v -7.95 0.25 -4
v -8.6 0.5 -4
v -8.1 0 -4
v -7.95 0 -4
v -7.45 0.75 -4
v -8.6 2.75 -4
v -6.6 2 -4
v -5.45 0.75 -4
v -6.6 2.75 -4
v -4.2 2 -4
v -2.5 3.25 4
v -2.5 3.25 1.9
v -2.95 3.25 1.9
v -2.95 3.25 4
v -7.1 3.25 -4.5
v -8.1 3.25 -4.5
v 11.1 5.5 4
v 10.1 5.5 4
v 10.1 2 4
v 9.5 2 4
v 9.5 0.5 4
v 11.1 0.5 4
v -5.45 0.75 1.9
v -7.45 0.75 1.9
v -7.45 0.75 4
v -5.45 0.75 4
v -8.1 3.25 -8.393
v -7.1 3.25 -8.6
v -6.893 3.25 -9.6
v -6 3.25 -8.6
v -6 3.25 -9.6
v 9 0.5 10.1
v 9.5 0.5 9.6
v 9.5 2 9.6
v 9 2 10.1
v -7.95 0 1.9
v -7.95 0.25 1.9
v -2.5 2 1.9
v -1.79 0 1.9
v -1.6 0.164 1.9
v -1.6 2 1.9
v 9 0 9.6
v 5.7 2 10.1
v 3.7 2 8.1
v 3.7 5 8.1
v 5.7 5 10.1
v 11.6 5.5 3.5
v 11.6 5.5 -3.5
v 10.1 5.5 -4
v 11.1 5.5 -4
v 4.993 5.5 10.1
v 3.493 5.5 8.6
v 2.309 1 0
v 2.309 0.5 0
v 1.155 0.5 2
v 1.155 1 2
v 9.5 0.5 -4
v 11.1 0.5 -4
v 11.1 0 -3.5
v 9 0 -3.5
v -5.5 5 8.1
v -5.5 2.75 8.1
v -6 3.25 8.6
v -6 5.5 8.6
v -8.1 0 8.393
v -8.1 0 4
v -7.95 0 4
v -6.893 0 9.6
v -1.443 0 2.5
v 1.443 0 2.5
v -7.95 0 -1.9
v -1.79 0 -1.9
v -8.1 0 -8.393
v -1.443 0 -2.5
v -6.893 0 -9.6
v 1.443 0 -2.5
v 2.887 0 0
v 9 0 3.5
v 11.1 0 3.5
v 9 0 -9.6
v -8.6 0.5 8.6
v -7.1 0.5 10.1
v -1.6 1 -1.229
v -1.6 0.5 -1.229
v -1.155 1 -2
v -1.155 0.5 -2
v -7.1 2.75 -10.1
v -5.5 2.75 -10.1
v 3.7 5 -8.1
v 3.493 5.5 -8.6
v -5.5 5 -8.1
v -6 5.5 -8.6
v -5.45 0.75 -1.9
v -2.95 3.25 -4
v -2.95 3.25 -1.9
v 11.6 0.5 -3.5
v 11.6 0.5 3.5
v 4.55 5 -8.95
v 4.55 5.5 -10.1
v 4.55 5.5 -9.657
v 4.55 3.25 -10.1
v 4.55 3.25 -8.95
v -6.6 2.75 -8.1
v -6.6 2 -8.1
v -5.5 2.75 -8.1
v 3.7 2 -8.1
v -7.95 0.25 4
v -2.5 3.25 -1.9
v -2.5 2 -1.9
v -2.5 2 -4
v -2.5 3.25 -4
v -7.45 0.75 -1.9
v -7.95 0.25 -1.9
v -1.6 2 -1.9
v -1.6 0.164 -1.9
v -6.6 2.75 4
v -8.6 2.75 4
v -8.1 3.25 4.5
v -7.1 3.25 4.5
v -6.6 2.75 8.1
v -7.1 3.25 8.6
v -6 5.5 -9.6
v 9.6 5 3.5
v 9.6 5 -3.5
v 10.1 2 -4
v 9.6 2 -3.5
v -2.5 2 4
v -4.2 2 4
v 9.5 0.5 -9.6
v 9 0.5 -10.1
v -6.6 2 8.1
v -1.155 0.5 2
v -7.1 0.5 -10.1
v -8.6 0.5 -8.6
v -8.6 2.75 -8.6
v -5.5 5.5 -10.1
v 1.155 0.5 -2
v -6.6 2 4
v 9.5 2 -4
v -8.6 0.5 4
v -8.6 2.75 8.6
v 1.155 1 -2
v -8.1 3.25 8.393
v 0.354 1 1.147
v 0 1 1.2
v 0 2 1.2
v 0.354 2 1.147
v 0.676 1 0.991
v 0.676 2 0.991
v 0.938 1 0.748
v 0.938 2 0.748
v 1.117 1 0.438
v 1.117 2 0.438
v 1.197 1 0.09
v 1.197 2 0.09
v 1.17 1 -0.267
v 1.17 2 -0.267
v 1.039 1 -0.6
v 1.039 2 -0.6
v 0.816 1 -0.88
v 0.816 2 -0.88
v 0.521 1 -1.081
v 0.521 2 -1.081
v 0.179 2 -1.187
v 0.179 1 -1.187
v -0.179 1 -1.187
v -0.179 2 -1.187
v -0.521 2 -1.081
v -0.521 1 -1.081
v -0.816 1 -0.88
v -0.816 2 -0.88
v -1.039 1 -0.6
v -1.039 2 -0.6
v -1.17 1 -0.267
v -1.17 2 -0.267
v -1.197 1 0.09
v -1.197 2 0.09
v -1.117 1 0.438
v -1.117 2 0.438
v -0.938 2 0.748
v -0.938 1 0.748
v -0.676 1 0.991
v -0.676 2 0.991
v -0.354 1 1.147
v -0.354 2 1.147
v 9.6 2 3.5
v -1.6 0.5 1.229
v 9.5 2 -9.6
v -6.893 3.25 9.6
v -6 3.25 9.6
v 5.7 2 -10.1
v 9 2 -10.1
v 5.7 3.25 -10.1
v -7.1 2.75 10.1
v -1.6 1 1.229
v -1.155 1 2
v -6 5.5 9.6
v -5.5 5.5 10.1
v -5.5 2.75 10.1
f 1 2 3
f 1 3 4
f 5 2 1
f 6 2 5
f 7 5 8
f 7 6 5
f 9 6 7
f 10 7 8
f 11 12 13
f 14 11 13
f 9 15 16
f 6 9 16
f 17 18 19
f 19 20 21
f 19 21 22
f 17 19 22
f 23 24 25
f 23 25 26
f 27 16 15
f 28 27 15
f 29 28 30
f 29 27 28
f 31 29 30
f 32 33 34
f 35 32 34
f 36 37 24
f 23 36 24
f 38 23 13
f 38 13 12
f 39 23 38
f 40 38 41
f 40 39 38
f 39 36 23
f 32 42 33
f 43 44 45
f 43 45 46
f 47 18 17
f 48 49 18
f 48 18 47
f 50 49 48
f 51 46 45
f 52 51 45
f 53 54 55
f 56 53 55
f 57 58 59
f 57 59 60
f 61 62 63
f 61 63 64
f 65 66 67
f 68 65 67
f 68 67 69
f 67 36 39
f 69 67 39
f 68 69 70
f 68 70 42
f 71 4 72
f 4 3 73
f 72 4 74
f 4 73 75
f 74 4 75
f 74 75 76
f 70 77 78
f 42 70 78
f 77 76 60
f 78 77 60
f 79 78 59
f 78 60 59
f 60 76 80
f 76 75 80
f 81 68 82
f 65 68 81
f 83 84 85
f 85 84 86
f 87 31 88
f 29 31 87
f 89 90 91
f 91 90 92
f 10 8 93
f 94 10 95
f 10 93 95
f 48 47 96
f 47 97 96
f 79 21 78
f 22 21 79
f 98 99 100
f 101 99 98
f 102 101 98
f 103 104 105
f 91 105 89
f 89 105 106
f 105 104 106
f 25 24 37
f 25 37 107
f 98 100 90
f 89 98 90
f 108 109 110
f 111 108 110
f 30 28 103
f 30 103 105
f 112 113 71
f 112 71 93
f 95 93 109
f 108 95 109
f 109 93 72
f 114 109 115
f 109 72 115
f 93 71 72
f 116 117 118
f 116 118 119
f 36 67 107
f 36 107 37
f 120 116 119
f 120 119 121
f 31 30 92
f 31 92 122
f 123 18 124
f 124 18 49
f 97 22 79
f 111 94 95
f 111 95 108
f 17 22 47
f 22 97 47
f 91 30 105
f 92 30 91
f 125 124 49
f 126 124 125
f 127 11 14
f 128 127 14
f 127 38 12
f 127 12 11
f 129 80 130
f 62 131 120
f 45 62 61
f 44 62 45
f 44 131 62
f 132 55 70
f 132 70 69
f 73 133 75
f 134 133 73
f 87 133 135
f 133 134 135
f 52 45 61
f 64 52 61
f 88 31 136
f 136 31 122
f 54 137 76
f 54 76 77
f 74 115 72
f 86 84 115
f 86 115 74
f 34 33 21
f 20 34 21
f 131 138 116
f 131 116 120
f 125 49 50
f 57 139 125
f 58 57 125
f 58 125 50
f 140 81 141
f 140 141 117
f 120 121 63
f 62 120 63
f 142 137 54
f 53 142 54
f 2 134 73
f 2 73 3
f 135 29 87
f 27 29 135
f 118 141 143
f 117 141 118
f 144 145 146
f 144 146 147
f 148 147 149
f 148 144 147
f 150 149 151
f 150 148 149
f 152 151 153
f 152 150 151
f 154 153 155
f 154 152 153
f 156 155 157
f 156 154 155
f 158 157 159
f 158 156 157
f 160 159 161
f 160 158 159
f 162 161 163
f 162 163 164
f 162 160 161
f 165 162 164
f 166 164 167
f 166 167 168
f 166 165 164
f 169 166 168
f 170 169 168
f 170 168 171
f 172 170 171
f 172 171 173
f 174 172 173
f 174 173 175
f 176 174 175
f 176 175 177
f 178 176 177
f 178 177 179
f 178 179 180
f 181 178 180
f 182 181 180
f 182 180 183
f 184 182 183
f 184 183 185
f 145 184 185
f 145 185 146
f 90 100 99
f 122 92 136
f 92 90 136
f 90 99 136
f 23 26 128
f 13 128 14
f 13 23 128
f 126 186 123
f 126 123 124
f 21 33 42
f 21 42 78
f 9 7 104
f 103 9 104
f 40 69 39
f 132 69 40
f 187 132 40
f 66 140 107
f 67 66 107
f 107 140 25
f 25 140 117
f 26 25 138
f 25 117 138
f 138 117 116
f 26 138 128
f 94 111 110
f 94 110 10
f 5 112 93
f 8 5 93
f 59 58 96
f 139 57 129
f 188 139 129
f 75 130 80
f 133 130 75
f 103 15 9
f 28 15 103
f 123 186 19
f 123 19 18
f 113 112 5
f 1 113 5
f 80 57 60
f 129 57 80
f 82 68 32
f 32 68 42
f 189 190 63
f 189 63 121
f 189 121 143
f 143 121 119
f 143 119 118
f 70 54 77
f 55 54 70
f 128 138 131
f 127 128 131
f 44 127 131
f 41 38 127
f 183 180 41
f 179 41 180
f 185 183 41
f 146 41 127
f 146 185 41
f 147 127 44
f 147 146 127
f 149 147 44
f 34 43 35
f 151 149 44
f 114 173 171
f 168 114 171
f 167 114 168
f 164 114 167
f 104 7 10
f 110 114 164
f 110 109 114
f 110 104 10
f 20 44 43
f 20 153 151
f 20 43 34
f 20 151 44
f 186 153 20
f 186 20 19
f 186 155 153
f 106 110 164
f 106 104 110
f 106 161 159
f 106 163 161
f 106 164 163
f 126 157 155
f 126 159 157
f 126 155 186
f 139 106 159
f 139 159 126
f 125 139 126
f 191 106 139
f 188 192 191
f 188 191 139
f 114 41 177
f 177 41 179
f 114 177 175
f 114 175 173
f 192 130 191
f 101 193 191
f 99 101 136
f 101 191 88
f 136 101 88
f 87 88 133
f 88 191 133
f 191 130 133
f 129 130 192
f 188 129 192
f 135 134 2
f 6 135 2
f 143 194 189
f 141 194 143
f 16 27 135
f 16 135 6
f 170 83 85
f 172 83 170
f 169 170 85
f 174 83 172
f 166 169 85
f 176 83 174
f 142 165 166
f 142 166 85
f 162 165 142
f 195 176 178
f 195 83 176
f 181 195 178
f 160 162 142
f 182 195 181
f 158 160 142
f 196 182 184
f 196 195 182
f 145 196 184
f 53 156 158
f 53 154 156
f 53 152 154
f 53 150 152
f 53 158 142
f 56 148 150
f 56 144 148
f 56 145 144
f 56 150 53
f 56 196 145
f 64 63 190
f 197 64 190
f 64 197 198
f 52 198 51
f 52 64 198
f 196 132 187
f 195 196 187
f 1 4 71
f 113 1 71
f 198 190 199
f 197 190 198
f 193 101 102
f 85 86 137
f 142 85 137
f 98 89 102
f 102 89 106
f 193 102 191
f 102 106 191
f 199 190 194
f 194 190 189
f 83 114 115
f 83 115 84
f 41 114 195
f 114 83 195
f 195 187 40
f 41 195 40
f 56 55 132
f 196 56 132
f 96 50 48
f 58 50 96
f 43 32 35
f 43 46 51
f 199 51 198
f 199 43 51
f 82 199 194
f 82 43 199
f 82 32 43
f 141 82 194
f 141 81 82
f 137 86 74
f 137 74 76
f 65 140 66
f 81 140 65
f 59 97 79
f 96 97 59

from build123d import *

# Parameters (mm, degrees)
SKETCH1_R           = 1.2
BOSS_EXTRUDE1_DEPTH = 2
SKETCH2_W           = 2
SKETCH2_H           = 8
BOSS_EXTRUDE2_DEPTH = 1.25
SKETCH3_W           = 2
SKETCH3_H           = 8
BOSS_EXTRUDE3_DEPTH = 2.25
CUT_EXTRUDE1_DEPTH  = 1
CUT_EXTRUDE2_DEPTH  = 2.1
CUT_EXTRUDE3_DEPTH  = 2.1
CHAMFER1_SIZE       = 1.5
CHAMFER2_SIZE       = 0.5


with BuildPart() as part:
    # Sketch1 → Boss-Extrude1 (new body)
    with BuildSketch(Plane(origin=(0, 0, 0), x_dir=(1, 0, 0), z_dir=(0, 1, 0))):
        Polygon((-8.6, -10.1), (9.5, -10.1), (9.5, -4), (11.6, -4), (11.6, 4), (9.5, 4), (9.5, 10.1), (-8.6, 10.1), (-8.6, 4), (-7.95, 4), (-7.95, 1.9), (-1.6, 1.9), (-1.6, -1.9), (-7.95, -1.9), (-7.95, -4), (-8.6, -4), align=None)
        with Locations(Location((0, 0, 0), (0, 0, 270))):
            Circle(SKETCH1_R, mode=Mode.SUBTRACT)
    extrude(amount=BOSS_EXTRUDE1_DEPTH)

    # Sketch2 → Boss-Extrude2 (add)
    with BuildSketch(Plane(origin=(0, 2, 0), x_dir=(1, 0, 0), z_dir=(0, 1, 0))):
        Polygon((-8.6, -4), (-7.95, -4), (-7.95, -1.9), (-2.5, -1.9), (-2.5, -4), (-6.6, -4), (-6.6, -8.1), (3.7, -8.1), (5.7, -10.1), (-8.6, -10.1), align=None)
        Polygon((-8.6, 10.1), (-8.6, 4), (-7.95, 4), (-7.95, 1.9), (-2.5, 1.9), (-2.5, 4), (-6.6, 4), (-6.6, 8.1), (3.7, 8.1), (5.7, 10.1), align=None)
        with Locations((10.6, 0)):
            Rectangle(SKETCH2_W, SKETCH2_H)
    extrude(amount=BOSS_EXTRUDE2_DEPTH)

    # Sketch3 → Boss-Extrude3 (add)
    with BuildSketch(Plane(origin=(0, 3.25, 0), x_dir=(1, 0, 0), z_dir=(0, 1, 0))):
        with Locations((10.6, 0)):
            Rectangle(SKETCH3_W, SKETCH3_H)
        Polygon((3.7, -8.1), (-6, -8.1), (-6, -10.1), (5.7, -10.1), align=None)
        Polygon((3.7, 8.1), (-6, 8.1), (-6, 10.1), (4.55, 10.1), (4.55, 8.95), align=None)
    extrude(amount=BOSS_EXTRUDE3_DEPTH)

    # Sketch4 → Cut-Extrude1 (cut)
    with BuildSketch(Plane.XZ):
        Polygon((-2.309401077, 0), (-1.154700538, -2), (1.154700538, -2), (2.309401077, 0), (1.154700538, 2), (-1.154700538, 2), align=None)
    extrude(amount=-CUT_EXTRUDE1_DEPTH, mode=Mode.SUBTRACT)

    # Sketch5 → Cut-Extrude2 (cut)
    with BuildSketch(Plane(origin=(0, 0, 1.9), x_dir=(-1, 0, 0), z_dir=(0, 0, -1))):
        Polygon((7.95, 0.75), (5.45, 0.75), (2.95, 3.25), (7.95, 3.25), align=None)
    extrude(amount=-CUT_EXTRUDE2_DEPTH, mode=Mode.SUBTRACT)

    # Sketch6 → Cut-Extrude3 (cut)
    with BuildSketch(Plane.XY.offset(-1.9)):
        Polygon((-7.95, 3.25), (-7.95, 0.75), (-5.45, 0.75), (-2.95, 3.25), align=None)
    extrude(amount=-CUT_EXTRUDE3_DEPTH, mode=Mode.SUBTRACT)

    # Chamfer1
    chamfer1_edges = [part.edges().sort_by_distance(p)[0] for p in [
        (-8.6, 1.625, -10.1),
        (-8.6, 1.625, 10.1),
    ]]
    chamfer(chamfer1_edges, length=CHAMFER1_SIZE)

    # Chamfer2
    chamfer2_edges = [part.edges().sort_by_distance(p)[0] for p in [
        (11.6, 2.75, -4),
        (11.6, 2.75, 4),
        (-8.6, 0, 6.3),
        (-7.85, 0, 9.35),
        (-8.6, 0, -6.3),
        (-7.85, 0, -9.35),
        (1.2, 0, -10.1),
        (9.5, 0, -7.05),
        (10.55, 0, -4),
        (1.2, 0, 10.1),
        (9.5, 0, 7.05),
        (10.55, 0, 4),
        (11.6, 0, 0),
        (-1.377350269, 0, -1.614359354),
        (0, 0, -2),
        (-1.377350269, 0, 1.614359354),
        (0, 0, 2),
        (1.732050808, 0, 1),
        (1.732050808, 0, -1),
        (-1.15, 5.5, -8.1),
        (-6, 4.375, -8.1),
        (-6.3, 3.25, -8.1),
        (-6.6, 3.25, -6.05),
        (-7.6, 3.25, -4),
        (-6.55, 3.25, -10.1),
        (-7.85, 3.25, -9.35),
        (-8.6, 3.25, -6.3),
        (-7.95, 0.75, 2.95),
        (-7.95, 0.75, -2.95),
        (9.6, 3.75, 4),
        (9.6, 3.75, -4),
        (9.6, 5.5, 0),
        (-1.15, 5.5, 8.1),
        (-6, 4.375, 8.1),
        (-6.3, 3.25, 8.1),
        (-6.6, 3.25, 6.05),
        (-7.6, 3.25, 4),
        (-6.55, 3.25, 10.1),
        (-7.85, 3.25, 9.35),
        (-8.6, 3.25, 6.3),
        (9.5, 1, -10.1),
        (9.5, 1, 10.1),
        (4.125, 5.5, -8.525),
        (4.7, 5.5, 9.1),
        (-6, 4.375, -10.1),
        (-6, 4.375, 10.1),
    ]]
    chamfer(chamfer2_edges, length=CHAMFER2_SIZE)


solid = part.part
